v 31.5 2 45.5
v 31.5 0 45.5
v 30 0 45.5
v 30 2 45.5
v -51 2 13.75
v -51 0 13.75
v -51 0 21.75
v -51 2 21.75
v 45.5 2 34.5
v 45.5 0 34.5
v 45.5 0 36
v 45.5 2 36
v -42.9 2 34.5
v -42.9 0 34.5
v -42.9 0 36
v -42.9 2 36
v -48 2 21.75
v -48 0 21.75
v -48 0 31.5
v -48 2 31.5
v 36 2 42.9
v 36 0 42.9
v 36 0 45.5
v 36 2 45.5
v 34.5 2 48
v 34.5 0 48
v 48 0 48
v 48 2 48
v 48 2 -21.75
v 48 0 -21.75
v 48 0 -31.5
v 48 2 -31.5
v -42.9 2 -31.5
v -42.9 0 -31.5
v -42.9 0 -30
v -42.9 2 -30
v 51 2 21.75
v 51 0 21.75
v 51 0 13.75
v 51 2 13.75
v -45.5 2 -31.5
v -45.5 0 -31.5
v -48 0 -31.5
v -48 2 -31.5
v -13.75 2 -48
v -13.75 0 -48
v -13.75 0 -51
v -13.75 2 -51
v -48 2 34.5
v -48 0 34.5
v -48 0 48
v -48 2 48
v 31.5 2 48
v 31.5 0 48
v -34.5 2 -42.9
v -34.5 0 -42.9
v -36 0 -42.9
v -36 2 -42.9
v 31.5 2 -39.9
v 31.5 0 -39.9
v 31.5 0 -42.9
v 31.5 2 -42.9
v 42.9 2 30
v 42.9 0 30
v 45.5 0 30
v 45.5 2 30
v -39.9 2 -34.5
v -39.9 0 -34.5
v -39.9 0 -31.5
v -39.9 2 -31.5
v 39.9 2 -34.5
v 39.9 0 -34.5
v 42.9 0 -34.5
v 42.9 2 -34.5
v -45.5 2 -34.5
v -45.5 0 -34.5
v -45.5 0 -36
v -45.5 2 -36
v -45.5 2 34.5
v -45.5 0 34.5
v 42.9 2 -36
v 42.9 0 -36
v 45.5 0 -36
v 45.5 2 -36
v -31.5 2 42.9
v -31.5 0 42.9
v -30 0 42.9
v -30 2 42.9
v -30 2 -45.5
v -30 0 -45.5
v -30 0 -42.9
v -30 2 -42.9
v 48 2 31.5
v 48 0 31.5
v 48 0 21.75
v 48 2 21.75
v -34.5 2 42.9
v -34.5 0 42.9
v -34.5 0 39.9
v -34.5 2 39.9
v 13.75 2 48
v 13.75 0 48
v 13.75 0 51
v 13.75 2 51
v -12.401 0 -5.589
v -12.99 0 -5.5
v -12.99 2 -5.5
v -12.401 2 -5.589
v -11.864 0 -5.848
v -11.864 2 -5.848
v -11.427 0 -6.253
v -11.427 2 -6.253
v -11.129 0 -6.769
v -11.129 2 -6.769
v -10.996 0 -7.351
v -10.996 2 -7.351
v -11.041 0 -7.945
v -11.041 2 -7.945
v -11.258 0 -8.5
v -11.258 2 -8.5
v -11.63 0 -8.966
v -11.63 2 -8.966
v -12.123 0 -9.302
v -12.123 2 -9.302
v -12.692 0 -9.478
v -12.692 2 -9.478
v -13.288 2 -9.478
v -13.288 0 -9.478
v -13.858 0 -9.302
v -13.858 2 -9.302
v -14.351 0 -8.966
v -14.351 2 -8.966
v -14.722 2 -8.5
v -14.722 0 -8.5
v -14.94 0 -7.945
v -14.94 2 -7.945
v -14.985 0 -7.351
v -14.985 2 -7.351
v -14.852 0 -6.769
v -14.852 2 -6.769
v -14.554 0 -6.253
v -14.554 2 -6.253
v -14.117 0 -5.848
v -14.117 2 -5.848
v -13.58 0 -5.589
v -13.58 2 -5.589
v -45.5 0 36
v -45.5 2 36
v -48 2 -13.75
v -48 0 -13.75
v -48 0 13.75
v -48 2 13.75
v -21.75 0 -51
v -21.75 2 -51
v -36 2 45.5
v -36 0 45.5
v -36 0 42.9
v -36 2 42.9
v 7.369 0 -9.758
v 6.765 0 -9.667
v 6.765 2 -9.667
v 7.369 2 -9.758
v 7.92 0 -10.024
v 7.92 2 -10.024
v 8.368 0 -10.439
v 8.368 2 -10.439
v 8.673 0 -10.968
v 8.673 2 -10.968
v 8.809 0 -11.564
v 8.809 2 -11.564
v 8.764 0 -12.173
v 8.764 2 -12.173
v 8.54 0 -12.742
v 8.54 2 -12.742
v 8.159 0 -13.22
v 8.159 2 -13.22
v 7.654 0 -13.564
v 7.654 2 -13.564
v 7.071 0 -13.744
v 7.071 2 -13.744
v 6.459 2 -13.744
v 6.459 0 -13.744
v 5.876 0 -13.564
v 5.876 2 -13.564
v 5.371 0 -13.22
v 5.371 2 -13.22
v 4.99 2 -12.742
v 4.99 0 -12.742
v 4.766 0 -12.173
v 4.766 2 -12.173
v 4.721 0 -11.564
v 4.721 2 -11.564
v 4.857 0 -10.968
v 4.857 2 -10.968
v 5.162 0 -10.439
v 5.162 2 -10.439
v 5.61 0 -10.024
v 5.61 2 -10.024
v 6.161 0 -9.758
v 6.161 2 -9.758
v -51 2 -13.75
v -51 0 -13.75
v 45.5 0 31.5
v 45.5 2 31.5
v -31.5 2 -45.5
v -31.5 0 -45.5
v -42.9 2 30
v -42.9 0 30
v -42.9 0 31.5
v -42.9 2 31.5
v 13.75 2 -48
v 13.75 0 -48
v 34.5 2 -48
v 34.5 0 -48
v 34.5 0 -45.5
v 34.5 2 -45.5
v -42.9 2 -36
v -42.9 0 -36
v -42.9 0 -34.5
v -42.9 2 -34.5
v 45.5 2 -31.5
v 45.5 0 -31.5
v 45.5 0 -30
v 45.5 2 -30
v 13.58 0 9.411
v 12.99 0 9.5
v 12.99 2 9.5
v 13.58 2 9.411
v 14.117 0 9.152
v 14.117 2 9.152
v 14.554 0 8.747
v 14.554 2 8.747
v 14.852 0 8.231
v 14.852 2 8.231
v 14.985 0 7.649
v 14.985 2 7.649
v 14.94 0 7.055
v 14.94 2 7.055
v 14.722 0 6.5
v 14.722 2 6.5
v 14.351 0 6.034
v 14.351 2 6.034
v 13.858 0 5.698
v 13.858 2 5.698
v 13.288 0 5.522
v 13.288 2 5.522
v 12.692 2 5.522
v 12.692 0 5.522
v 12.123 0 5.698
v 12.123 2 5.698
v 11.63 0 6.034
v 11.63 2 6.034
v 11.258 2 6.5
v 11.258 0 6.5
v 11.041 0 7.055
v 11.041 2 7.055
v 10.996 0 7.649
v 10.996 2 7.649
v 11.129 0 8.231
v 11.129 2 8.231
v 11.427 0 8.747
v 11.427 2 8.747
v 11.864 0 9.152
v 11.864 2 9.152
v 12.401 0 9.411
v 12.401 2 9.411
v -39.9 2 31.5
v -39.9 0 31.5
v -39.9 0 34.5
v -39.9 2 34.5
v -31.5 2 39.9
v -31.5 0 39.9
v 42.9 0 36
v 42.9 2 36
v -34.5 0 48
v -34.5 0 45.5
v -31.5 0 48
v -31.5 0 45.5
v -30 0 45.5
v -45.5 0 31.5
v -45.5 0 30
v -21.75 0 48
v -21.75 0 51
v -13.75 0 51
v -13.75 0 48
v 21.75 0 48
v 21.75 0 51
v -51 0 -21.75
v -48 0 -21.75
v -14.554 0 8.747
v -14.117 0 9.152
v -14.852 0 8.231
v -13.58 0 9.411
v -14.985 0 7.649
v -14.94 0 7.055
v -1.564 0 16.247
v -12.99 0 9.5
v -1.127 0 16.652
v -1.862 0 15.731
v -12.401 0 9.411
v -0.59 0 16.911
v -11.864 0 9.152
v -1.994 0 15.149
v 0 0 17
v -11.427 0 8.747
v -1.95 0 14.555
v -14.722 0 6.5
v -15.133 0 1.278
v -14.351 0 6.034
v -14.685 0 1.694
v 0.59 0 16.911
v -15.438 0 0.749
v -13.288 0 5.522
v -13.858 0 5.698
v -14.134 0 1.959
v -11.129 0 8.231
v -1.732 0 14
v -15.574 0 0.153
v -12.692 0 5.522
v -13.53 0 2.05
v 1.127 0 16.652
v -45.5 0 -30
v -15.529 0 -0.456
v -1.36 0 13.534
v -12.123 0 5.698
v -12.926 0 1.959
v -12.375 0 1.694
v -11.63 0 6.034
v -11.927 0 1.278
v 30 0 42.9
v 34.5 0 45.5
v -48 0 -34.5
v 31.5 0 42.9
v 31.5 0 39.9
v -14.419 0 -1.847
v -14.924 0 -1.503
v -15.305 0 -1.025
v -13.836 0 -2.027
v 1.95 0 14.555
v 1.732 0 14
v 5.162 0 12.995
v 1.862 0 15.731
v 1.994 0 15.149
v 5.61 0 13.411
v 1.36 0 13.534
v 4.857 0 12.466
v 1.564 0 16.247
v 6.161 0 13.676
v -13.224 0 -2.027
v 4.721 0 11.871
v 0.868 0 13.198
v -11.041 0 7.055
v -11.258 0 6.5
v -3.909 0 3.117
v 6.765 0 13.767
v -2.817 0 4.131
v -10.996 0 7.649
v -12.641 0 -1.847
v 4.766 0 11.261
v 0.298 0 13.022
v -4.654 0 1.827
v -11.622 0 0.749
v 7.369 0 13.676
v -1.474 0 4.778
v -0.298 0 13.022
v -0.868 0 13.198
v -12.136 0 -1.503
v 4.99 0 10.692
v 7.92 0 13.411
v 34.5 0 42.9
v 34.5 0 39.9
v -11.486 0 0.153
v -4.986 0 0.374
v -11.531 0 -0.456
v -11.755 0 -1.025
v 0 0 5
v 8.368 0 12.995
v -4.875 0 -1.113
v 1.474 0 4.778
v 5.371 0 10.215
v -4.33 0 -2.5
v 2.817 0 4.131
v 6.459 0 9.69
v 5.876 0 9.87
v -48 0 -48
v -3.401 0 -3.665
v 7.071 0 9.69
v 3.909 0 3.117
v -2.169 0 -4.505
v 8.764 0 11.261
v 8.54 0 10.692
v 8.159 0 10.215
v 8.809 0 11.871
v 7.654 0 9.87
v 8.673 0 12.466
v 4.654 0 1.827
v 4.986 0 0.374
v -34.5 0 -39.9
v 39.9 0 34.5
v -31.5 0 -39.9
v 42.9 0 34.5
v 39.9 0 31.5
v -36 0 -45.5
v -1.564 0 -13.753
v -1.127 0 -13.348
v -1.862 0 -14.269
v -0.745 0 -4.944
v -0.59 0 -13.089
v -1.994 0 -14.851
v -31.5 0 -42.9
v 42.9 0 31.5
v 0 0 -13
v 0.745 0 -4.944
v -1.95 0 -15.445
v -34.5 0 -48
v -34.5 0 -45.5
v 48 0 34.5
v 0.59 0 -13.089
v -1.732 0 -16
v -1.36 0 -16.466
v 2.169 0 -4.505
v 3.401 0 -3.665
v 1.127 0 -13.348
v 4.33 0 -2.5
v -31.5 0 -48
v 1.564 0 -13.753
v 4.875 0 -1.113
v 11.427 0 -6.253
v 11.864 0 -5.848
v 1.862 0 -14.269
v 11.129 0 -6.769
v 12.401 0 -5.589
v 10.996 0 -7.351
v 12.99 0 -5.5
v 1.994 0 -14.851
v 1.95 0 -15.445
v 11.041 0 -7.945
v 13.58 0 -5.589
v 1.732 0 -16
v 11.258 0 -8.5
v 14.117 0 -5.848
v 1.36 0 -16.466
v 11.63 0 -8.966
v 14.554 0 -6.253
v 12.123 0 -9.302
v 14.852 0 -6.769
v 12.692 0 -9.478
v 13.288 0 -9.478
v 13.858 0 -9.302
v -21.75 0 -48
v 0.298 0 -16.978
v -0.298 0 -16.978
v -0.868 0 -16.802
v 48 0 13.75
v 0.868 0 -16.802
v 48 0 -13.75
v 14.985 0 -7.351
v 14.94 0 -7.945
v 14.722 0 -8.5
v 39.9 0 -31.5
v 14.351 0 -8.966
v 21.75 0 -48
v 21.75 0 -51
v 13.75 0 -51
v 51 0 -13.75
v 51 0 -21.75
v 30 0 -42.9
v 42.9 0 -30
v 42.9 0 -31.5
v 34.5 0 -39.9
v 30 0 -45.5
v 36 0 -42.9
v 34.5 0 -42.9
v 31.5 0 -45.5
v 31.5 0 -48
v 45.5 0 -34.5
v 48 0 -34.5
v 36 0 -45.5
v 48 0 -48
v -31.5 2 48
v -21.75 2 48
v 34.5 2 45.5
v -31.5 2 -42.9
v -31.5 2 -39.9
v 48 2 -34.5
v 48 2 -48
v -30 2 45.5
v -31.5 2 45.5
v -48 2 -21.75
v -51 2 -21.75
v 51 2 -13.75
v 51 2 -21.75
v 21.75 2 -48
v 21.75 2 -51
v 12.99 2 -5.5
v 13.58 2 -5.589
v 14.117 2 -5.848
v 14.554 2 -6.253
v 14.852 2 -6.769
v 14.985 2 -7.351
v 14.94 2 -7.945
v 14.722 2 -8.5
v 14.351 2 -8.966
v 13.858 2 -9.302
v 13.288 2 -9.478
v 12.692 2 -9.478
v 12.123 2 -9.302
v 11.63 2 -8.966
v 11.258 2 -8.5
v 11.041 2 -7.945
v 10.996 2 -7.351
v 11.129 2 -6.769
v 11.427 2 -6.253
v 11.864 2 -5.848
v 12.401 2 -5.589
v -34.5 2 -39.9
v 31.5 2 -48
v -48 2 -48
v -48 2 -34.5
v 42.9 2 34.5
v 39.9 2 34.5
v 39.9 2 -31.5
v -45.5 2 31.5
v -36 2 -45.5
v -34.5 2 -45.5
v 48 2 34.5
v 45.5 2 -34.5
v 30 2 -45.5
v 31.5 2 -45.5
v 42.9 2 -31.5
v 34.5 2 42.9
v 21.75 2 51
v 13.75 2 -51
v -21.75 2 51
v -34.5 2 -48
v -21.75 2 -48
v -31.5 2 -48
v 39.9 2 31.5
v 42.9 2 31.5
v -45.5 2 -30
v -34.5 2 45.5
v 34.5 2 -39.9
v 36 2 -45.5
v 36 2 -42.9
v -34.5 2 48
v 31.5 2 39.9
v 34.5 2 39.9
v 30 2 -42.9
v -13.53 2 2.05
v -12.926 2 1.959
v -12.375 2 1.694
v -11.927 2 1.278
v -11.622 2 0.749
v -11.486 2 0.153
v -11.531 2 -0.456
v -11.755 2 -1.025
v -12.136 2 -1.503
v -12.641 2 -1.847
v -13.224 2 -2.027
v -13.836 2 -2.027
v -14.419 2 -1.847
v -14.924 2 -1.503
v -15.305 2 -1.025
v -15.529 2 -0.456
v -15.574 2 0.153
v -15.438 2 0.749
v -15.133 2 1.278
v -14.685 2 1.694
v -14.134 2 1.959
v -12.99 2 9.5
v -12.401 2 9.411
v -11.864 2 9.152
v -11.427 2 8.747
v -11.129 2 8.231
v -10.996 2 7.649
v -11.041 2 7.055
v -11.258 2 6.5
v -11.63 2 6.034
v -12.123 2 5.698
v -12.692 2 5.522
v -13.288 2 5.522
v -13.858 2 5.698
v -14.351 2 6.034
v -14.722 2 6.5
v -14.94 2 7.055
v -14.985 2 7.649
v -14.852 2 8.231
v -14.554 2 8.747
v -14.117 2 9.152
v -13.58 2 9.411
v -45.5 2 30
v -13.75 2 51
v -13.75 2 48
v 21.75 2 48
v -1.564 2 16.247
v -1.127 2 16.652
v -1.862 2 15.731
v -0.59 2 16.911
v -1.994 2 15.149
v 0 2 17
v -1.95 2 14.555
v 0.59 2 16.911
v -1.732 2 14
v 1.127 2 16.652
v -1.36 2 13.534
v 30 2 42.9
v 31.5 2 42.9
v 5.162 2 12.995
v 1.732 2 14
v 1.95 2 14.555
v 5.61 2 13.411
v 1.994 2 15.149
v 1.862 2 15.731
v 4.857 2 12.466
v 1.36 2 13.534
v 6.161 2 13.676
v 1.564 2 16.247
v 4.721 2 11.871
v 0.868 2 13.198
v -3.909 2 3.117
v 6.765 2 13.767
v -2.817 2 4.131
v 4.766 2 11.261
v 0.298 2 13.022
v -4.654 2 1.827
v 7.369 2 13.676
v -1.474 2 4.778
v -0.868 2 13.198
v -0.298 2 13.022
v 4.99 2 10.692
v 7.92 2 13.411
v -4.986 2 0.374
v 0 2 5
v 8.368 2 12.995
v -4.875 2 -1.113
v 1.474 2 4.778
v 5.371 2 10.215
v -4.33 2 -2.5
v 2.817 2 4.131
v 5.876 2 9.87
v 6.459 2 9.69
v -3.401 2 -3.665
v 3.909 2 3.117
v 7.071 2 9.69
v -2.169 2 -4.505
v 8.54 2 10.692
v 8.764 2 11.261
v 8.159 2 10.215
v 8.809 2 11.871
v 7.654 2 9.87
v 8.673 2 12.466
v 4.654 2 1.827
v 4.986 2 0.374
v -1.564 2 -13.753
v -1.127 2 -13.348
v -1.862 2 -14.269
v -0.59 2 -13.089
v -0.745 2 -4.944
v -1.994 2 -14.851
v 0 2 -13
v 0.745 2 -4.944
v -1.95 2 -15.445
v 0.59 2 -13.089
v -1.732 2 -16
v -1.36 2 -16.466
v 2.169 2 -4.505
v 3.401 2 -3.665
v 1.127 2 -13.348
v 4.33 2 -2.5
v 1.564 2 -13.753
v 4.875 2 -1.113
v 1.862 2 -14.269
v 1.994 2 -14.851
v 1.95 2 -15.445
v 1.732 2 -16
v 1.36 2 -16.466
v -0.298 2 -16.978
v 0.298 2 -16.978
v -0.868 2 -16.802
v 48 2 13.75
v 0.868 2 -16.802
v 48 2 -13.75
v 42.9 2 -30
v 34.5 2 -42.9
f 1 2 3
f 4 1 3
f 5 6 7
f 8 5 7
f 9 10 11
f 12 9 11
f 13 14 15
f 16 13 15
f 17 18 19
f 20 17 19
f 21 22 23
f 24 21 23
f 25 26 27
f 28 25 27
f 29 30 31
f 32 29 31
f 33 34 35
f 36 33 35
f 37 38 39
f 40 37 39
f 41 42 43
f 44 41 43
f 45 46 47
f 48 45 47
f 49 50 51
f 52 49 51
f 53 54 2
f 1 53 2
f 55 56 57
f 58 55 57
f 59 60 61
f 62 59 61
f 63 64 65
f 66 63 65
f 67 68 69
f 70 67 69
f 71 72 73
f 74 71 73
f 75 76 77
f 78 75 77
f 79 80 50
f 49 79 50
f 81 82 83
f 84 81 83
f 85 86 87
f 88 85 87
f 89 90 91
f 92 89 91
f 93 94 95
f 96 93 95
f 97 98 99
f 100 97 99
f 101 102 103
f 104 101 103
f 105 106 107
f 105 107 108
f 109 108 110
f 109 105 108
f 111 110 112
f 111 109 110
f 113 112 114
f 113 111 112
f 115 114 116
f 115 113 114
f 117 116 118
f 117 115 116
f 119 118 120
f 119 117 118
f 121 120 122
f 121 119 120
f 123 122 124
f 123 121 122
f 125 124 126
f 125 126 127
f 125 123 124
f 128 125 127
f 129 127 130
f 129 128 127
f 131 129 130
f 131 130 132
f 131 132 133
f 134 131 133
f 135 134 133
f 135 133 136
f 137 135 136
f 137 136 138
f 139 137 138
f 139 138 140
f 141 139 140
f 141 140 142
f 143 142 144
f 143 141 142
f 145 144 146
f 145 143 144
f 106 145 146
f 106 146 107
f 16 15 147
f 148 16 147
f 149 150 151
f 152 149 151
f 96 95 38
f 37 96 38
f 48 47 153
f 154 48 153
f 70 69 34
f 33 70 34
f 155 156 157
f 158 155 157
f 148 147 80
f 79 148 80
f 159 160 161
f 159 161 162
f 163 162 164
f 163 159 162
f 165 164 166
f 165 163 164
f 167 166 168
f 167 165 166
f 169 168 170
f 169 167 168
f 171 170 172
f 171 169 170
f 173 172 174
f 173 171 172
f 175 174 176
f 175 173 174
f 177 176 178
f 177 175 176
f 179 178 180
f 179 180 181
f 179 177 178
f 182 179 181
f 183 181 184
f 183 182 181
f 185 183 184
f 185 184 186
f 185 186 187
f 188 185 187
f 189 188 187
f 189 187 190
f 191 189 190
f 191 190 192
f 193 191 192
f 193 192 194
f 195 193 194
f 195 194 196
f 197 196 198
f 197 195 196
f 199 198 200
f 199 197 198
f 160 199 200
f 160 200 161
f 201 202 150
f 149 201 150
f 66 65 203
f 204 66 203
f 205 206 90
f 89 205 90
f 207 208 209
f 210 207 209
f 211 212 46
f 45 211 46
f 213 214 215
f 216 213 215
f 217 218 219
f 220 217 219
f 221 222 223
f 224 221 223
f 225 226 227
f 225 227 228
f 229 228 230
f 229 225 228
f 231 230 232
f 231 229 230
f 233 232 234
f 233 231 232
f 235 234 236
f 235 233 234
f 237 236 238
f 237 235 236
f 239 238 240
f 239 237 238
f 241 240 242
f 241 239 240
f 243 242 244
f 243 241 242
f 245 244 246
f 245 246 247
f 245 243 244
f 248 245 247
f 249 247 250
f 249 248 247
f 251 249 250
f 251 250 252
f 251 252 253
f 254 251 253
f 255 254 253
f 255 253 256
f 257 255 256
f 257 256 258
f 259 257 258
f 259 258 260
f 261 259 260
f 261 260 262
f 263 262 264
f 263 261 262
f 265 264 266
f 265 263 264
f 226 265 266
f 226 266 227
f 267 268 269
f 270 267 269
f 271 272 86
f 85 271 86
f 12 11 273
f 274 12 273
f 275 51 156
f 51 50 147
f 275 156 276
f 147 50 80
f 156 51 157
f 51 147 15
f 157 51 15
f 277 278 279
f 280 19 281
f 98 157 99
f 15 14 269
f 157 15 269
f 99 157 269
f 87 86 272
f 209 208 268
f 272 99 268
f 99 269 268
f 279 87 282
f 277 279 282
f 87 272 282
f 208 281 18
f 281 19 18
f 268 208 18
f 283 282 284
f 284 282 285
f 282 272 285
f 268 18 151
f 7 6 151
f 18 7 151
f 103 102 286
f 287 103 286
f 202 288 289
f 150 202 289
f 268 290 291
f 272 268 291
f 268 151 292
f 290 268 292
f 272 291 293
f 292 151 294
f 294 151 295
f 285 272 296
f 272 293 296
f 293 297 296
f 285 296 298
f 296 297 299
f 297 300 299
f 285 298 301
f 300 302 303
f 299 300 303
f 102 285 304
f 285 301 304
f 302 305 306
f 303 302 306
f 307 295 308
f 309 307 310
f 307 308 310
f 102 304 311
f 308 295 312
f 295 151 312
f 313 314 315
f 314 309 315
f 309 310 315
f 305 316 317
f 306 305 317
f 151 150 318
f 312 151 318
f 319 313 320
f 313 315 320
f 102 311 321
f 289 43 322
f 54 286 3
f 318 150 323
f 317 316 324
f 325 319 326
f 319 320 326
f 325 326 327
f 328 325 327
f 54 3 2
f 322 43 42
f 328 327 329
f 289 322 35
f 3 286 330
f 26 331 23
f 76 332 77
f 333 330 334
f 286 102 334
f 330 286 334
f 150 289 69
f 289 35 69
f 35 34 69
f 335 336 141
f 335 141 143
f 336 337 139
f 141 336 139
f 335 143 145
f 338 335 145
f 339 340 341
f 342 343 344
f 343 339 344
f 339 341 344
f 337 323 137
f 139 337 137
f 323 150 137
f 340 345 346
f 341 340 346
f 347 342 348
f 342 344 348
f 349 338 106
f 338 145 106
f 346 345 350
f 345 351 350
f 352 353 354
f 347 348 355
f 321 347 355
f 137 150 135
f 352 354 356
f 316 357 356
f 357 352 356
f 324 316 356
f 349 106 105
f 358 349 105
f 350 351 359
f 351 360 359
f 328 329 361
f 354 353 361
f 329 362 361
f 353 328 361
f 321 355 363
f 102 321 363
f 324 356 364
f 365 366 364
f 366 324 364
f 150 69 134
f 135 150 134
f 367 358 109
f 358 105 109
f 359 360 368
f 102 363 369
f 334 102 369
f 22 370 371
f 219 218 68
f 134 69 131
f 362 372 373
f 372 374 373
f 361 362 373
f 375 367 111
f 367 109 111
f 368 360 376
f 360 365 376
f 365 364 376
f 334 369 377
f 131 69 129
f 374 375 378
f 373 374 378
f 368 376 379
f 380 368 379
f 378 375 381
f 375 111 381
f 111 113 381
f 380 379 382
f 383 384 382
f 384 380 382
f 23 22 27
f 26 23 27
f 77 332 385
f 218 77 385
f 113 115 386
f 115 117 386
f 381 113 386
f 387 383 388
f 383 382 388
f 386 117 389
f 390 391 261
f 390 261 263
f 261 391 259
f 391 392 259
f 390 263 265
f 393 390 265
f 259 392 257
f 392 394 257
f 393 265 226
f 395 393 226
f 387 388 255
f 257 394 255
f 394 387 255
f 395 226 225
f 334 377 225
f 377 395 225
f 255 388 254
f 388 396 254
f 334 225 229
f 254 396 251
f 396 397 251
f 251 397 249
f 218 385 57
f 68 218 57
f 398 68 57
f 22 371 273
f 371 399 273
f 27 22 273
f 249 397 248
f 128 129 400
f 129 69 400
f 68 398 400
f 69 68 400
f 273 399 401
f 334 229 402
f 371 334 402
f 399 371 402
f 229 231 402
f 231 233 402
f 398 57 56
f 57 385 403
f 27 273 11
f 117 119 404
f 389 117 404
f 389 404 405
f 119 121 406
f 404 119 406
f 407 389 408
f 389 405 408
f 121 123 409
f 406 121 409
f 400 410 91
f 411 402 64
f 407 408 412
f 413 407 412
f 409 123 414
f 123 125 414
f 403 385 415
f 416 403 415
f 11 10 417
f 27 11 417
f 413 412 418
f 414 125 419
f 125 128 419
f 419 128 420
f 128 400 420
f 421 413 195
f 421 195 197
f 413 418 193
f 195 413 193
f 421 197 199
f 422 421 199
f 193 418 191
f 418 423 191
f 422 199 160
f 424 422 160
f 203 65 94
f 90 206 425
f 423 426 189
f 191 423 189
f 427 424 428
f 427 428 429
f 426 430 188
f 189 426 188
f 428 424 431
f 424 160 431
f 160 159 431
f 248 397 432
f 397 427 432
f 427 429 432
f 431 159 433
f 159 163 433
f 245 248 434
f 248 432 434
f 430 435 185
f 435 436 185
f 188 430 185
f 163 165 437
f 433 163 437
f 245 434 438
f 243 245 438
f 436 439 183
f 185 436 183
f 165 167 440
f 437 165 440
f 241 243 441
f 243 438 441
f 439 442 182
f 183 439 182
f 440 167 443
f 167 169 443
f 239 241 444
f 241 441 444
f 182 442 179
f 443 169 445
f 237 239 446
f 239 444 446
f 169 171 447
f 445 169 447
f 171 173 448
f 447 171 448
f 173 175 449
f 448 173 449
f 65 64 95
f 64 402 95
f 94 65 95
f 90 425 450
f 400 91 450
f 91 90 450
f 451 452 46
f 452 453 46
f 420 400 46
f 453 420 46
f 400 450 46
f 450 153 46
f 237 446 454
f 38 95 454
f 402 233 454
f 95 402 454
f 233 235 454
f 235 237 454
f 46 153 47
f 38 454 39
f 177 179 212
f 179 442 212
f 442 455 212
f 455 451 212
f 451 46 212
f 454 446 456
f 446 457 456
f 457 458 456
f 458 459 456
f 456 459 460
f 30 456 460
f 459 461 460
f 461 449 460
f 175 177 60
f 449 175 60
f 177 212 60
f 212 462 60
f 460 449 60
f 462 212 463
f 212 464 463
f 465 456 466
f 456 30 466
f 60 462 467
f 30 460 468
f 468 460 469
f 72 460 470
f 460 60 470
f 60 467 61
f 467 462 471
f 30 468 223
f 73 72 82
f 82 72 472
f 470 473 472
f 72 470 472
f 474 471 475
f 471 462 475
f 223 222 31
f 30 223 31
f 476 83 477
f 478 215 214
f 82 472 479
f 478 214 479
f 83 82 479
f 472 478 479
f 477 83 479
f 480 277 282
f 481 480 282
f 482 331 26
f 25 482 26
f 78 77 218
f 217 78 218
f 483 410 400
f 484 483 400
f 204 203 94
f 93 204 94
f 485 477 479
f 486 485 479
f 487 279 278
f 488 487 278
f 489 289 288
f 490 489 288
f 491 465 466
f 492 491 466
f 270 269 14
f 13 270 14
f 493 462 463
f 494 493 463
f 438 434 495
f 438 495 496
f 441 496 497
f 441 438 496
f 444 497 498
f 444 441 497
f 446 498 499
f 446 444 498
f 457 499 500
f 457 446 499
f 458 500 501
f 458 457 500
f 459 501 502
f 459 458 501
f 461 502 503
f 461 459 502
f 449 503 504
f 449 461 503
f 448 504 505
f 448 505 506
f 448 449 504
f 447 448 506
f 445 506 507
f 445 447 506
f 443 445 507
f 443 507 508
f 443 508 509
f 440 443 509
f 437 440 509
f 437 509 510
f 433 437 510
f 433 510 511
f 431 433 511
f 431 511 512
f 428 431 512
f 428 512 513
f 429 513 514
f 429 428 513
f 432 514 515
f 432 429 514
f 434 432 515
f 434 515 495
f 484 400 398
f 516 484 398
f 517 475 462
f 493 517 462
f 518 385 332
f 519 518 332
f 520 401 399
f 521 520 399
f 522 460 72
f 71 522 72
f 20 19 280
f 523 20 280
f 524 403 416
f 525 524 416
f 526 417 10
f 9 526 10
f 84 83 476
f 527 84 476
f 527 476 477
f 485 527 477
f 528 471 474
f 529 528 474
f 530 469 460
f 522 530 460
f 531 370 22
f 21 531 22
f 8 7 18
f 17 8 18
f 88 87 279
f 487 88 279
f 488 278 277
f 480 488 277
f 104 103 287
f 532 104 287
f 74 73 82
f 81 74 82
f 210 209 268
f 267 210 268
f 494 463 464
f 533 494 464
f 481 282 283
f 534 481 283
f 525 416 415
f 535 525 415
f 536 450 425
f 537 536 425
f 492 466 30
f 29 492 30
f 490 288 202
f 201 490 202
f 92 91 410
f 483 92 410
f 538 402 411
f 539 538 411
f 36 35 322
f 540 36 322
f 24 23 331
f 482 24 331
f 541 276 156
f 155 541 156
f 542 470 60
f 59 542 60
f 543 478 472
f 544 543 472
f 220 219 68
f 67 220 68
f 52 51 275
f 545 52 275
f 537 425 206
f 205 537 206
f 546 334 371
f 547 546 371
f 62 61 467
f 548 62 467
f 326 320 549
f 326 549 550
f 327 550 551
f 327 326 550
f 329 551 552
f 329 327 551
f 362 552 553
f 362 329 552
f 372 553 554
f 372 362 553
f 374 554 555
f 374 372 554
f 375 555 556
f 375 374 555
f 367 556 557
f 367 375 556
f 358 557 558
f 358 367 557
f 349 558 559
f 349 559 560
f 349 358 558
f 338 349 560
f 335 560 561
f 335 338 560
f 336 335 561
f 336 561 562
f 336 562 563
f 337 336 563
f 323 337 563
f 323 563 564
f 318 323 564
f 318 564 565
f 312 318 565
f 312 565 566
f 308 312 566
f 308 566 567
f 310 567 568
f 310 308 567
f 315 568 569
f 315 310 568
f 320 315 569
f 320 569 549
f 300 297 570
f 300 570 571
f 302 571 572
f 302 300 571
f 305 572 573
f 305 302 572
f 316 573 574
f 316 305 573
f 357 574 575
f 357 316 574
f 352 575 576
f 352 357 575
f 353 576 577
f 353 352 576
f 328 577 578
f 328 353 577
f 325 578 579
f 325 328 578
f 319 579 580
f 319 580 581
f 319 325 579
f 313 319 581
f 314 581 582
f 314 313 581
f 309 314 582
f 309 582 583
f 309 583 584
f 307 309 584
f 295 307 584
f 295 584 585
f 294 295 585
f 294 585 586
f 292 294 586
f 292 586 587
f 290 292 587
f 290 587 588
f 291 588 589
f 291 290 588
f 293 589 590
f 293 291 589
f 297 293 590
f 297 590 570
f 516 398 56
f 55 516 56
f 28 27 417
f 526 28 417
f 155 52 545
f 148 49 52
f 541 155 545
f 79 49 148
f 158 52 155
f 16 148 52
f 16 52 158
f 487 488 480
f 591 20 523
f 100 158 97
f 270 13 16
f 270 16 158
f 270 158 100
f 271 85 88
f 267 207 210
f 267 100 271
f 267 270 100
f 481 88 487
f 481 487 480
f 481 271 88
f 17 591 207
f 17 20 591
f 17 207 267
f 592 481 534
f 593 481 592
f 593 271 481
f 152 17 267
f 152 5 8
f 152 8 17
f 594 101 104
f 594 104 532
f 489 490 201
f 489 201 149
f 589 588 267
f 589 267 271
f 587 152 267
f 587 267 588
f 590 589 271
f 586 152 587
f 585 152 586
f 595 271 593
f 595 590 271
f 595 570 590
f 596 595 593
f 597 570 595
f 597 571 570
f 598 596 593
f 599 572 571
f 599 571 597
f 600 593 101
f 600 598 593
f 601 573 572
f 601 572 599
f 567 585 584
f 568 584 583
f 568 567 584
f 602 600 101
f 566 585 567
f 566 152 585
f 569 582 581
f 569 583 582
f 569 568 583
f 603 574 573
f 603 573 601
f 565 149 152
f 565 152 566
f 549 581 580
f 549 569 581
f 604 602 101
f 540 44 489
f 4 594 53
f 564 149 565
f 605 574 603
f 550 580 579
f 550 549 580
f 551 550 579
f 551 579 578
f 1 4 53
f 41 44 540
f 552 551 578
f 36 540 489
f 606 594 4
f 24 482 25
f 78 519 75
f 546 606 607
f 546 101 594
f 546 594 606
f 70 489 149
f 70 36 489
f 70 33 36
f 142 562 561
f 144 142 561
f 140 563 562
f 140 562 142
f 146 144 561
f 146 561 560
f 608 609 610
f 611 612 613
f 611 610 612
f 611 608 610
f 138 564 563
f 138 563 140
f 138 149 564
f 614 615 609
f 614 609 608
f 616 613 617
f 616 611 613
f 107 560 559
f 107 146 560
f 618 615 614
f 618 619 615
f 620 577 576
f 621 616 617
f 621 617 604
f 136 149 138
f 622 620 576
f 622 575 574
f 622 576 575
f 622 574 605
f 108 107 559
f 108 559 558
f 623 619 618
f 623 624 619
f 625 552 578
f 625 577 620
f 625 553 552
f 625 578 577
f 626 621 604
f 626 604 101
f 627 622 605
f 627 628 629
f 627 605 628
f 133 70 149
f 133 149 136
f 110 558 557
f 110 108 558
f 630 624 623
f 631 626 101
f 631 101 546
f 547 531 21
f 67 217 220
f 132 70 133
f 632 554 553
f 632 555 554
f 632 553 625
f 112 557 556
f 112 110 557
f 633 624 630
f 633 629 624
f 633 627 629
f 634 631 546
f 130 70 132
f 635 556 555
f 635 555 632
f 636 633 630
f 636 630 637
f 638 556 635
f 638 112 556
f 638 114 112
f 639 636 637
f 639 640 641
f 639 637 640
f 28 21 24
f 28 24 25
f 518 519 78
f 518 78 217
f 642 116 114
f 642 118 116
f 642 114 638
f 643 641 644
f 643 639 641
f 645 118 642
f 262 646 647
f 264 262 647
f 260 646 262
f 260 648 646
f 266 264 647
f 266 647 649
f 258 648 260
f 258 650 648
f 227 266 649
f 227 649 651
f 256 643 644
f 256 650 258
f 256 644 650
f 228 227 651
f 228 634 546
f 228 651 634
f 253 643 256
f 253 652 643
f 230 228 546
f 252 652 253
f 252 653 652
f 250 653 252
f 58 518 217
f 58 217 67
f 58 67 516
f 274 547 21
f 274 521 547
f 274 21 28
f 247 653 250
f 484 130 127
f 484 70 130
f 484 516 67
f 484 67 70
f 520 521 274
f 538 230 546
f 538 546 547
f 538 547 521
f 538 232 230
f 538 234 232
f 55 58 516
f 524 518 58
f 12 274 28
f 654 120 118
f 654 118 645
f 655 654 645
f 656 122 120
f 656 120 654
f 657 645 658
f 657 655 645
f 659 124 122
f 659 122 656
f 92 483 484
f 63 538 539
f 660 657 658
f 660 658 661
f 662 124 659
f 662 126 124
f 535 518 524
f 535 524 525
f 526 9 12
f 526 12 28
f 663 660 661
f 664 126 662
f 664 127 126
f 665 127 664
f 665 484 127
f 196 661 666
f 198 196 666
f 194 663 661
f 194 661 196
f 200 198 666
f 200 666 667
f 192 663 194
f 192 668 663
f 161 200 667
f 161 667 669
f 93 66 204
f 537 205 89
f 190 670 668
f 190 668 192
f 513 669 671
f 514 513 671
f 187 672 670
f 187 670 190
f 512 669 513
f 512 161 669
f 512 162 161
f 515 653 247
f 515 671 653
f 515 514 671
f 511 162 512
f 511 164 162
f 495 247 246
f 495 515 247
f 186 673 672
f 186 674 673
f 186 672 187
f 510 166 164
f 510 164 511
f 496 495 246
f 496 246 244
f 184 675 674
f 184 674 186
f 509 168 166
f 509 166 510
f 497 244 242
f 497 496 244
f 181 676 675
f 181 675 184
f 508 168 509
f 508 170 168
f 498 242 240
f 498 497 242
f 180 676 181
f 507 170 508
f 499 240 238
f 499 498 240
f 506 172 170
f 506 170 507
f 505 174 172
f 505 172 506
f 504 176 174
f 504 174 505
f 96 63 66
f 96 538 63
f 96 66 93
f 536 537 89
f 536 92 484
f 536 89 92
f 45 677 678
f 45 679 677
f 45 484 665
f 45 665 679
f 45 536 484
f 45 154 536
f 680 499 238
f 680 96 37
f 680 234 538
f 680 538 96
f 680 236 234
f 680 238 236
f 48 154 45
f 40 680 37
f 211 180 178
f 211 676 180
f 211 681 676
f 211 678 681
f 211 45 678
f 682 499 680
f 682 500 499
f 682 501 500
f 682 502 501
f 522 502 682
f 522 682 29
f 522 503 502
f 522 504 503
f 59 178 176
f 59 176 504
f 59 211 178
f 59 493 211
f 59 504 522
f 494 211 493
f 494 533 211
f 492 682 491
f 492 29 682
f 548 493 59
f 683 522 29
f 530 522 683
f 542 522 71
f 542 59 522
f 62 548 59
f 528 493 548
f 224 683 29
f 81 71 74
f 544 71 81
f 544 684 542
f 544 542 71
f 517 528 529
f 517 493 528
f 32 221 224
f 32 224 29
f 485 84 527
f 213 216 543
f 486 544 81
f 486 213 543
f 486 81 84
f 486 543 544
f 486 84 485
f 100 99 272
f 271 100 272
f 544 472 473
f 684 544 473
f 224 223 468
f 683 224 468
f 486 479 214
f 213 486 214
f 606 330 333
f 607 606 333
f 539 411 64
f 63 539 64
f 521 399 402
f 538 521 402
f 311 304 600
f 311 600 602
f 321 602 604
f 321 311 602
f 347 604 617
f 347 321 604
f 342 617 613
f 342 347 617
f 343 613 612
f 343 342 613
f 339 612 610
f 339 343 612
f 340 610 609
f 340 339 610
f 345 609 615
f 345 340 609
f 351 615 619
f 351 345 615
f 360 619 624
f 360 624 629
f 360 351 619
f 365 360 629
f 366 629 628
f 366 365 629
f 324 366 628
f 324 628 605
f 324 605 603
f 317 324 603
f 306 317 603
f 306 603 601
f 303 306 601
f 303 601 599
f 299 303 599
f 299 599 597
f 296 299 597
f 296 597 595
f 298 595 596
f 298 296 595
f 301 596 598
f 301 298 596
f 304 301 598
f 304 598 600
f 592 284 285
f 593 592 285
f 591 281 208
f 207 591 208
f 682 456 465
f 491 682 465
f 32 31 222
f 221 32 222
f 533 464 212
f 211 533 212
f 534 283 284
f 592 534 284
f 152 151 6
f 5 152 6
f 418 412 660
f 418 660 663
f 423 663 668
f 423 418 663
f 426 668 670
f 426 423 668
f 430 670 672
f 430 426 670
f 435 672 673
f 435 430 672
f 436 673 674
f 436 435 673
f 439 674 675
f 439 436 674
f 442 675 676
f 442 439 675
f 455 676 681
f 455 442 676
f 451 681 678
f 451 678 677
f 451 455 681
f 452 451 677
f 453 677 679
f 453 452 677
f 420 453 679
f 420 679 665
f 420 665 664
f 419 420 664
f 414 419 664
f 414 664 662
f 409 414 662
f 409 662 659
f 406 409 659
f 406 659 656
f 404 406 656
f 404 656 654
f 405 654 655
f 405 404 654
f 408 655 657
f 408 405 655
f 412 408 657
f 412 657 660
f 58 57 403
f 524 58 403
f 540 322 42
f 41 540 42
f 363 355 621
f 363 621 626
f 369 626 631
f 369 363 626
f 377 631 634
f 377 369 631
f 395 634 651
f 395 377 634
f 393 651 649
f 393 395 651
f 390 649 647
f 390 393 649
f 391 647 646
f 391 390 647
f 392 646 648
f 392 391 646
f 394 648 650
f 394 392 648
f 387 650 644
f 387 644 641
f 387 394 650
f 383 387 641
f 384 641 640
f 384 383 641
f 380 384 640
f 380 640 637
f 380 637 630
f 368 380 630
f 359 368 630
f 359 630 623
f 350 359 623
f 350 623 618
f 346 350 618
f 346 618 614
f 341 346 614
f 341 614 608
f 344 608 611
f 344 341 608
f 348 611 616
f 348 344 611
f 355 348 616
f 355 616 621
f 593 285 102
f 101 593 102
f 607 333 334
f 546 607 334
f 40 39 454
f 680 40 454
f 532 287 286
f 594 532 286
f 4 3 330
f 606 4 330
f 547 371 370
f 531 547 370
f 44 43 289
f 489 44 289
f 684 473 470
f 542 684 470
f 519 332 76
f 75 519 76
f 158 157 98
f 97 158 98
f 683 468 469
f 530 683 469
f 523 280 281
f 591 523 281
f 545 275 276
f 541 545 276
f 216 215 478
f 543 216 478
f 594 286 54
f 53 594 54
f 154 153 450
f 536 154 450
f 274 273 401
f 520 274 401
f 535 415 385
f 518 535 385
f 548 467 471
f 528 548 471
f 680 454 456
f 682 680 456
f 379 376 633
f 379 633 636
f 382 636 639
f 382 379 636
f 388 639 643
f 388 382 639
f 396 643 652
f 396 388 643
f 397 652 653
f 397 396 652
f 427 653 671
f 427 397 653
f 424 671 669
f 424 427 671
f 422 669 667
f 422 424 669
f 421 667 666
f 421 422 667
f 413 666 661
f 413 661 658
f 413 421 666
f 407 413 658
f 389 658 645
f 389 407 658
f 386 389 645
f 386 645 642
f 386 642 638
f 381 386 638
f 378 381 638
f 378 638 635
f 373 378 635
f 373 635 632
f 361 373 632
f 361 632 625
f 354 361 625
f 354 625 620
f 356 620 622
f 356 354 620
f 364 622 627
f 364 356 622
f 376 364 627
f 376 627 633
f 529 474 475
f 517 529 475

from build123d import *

# Parameters (mm, degrees)
SKETCH_1_R      = 2
SKETCH_1_R_2    = 2.05
SKETCH_1_R_3    = 5
EXTRUDE_1_DEPTH = 2


with BuildPart() as part:
    # 草图1 → 凸台-拉伸1 (new body)
    with BuildSketch(Plane(origin=(0, 0, 0), x_dir=(1, 0, 0), z_dir=(0, 1, 0))):
        Polygon((-31.5, -48), (-21.75, -48), (-21.75, -51), (-13.75, -51), (-13.75, -48), (13.75, -48), (13.75, -51), (21.75, -51), (21.75, -48), (31.5, -48), (31.5, -45.5), (30, -45.5), (30, -42.9), (31.5, -42.9), (31.5, -39.9), (34.5, -39.9), (34.5, -42.9), (36, -42.9), (36, -45.5), (34.5, -45.5), (34.5, -48), (35.5, -48), (47.5, -48), (48, -48), (48, -35.5), (48, -34.5), (45.5, -34.5), (45.5, -36), (42.9, -36), (42.9, -34.5), (39.9, -34.5), (39.9, -31.5), (42.9, -31.5), (42.9, -30), (45.5, -30), (45.5, -31.5), (48, -31.5), (48, -21.75), (51, -21.75), (51, -13.75), (48, -13.75), (48, 13.75), (51, 13.75), (51, 21.75), (48, 21.75), (48, 31.5), (45.5, 31.5), (45.5, 30), (42.9, 30), (42.9, 31.5), (39.9, 31.5), (39.9, 34.5), (42.9, 34.5), (42.9, 36), (45.5, 36), (45.5, 34.5), (48, 34.5), (48, 46.5), (48, 48), (35.5, 48), (34.5, 48), (34.5, 45.5), (36, 45.5), (36, 42.9), (34.5, 42.9), (34.5, 39.9), (31.5, 39.9), (31.5, 42.9), (30, 42.9), (30, 45.5), (31.5, 45.5), (31.5, 48), (21.75, 48), (21.75, 51), (13.75, 51), (13.75, 48), (-13.75, 48), (-13.75, 51), (-21.75, 51), (-21.75, 48), (-31.5, 48), (-31.5, 45.5), (-30, 45.5), (-30, 42.9), (-31.5, 42.9), (-31.5, 39.9), (-34.5, 39.9), (-34.5, 42.9), (-36, 42.9), (-36, 45.5), (-34.5, 45.5), (-34.5, 48), (-42.9, 48), (-48, 48), (-48, 47), (-48, 34.5), (-45.5, 34.5), (-45.5, 36), (-42.9, 36), (-42.9, 34.5), (-39.9, 34.5), (-39.9, 31.5), (-42.9, 31.5), (-42.9, 30), (-45.5, 30), (-45.5, 31.5), (-48, 31.5), (-48, 21.75), (-51, 21.75), (-51, 13.75), (-48, 13.75), (-48, -13.75), (-51, -13.75), (-51, -21.75), (-48, -21.75), (-48, -31.5), (-45.5, -31.5), (-45.5, -30), (-42.9, -30), (-42.9, -31.5), (-39.9, -31.5), (-39.9, -34.5), (-42.9, -34.5), (-42.9, -36), (-45.5, -36), (-45.5, -34.5), (-48, -34.5), (-48, -35.5), (-48, -48), (-47, -48), (-34.5, -48), (-34.5, -45.5), (-36, -45.5), (-36, -42.9), (-34.5, -42.9), (-34.5, -39.9), (-31.5, -39.9), (-31.5, -42.9), (-30, -42.9), (-30, -45.5), (-31.5, -45.5), align=None)
        with Locations(Location((0, -15, 0), (0, 0, 270))):
            Circle(SKETCH_1_R, mode=Mode.SUBTRACT)
        with Locations(Location((-12.990381057, -7.5, 0), (0, 0, 270))):
            Circle(SKETCH_1_R, mode=Mode.SUBTRACT)
        with Locations(Location((-12.990381057, 7.5, 0), (0, 0, 270))):
            Circle(SKETCH_1_R, mode=Mode.SUBTRACT)
        with Locations(Location((0, 15, 0), (0, 0, 270))):
            Circle(SKETCH_1_R, mode=Mode.SUBTRACT)
        with Locations(Location((12.990381057, 7.5, 0), (0, 0, 270))):
            Circle(SKETCH_1_R, mode=Mode.SUBTRACT)
        with Locations(Location((12.990381057, -7.5, 0), (0, 0, 270))):
            Circle(SKETCH_1_R, mode=Mode.SUBTRACT)
        with Locations(Location((-13.53, 0, 0), (0, 0, 270))):
            Circle(SKETCH_1_R_2, mode=Mode.SUBTRACT)
        with Locations(Location((6.765, 11.717323713, 0), (0, 0, 270))):
            Circle(SKETCH_1_R_2, mode=Mode.SUBTRACT)
        with Locations(Location((6.765, -11.717323713, 0), (0, 0, 270))):
            Circle(SKETCH_1_R_2, mode=Mode.SUBTRACT)
        with Locations(Location((0, 0, 0), (0, 0, 270))):
            Circle(SKETCH_1_R_3, mode=Mode.SUBTRACT)
    extrude(amount=EXTRUDE_1_DEPTH)


solid = part.part
